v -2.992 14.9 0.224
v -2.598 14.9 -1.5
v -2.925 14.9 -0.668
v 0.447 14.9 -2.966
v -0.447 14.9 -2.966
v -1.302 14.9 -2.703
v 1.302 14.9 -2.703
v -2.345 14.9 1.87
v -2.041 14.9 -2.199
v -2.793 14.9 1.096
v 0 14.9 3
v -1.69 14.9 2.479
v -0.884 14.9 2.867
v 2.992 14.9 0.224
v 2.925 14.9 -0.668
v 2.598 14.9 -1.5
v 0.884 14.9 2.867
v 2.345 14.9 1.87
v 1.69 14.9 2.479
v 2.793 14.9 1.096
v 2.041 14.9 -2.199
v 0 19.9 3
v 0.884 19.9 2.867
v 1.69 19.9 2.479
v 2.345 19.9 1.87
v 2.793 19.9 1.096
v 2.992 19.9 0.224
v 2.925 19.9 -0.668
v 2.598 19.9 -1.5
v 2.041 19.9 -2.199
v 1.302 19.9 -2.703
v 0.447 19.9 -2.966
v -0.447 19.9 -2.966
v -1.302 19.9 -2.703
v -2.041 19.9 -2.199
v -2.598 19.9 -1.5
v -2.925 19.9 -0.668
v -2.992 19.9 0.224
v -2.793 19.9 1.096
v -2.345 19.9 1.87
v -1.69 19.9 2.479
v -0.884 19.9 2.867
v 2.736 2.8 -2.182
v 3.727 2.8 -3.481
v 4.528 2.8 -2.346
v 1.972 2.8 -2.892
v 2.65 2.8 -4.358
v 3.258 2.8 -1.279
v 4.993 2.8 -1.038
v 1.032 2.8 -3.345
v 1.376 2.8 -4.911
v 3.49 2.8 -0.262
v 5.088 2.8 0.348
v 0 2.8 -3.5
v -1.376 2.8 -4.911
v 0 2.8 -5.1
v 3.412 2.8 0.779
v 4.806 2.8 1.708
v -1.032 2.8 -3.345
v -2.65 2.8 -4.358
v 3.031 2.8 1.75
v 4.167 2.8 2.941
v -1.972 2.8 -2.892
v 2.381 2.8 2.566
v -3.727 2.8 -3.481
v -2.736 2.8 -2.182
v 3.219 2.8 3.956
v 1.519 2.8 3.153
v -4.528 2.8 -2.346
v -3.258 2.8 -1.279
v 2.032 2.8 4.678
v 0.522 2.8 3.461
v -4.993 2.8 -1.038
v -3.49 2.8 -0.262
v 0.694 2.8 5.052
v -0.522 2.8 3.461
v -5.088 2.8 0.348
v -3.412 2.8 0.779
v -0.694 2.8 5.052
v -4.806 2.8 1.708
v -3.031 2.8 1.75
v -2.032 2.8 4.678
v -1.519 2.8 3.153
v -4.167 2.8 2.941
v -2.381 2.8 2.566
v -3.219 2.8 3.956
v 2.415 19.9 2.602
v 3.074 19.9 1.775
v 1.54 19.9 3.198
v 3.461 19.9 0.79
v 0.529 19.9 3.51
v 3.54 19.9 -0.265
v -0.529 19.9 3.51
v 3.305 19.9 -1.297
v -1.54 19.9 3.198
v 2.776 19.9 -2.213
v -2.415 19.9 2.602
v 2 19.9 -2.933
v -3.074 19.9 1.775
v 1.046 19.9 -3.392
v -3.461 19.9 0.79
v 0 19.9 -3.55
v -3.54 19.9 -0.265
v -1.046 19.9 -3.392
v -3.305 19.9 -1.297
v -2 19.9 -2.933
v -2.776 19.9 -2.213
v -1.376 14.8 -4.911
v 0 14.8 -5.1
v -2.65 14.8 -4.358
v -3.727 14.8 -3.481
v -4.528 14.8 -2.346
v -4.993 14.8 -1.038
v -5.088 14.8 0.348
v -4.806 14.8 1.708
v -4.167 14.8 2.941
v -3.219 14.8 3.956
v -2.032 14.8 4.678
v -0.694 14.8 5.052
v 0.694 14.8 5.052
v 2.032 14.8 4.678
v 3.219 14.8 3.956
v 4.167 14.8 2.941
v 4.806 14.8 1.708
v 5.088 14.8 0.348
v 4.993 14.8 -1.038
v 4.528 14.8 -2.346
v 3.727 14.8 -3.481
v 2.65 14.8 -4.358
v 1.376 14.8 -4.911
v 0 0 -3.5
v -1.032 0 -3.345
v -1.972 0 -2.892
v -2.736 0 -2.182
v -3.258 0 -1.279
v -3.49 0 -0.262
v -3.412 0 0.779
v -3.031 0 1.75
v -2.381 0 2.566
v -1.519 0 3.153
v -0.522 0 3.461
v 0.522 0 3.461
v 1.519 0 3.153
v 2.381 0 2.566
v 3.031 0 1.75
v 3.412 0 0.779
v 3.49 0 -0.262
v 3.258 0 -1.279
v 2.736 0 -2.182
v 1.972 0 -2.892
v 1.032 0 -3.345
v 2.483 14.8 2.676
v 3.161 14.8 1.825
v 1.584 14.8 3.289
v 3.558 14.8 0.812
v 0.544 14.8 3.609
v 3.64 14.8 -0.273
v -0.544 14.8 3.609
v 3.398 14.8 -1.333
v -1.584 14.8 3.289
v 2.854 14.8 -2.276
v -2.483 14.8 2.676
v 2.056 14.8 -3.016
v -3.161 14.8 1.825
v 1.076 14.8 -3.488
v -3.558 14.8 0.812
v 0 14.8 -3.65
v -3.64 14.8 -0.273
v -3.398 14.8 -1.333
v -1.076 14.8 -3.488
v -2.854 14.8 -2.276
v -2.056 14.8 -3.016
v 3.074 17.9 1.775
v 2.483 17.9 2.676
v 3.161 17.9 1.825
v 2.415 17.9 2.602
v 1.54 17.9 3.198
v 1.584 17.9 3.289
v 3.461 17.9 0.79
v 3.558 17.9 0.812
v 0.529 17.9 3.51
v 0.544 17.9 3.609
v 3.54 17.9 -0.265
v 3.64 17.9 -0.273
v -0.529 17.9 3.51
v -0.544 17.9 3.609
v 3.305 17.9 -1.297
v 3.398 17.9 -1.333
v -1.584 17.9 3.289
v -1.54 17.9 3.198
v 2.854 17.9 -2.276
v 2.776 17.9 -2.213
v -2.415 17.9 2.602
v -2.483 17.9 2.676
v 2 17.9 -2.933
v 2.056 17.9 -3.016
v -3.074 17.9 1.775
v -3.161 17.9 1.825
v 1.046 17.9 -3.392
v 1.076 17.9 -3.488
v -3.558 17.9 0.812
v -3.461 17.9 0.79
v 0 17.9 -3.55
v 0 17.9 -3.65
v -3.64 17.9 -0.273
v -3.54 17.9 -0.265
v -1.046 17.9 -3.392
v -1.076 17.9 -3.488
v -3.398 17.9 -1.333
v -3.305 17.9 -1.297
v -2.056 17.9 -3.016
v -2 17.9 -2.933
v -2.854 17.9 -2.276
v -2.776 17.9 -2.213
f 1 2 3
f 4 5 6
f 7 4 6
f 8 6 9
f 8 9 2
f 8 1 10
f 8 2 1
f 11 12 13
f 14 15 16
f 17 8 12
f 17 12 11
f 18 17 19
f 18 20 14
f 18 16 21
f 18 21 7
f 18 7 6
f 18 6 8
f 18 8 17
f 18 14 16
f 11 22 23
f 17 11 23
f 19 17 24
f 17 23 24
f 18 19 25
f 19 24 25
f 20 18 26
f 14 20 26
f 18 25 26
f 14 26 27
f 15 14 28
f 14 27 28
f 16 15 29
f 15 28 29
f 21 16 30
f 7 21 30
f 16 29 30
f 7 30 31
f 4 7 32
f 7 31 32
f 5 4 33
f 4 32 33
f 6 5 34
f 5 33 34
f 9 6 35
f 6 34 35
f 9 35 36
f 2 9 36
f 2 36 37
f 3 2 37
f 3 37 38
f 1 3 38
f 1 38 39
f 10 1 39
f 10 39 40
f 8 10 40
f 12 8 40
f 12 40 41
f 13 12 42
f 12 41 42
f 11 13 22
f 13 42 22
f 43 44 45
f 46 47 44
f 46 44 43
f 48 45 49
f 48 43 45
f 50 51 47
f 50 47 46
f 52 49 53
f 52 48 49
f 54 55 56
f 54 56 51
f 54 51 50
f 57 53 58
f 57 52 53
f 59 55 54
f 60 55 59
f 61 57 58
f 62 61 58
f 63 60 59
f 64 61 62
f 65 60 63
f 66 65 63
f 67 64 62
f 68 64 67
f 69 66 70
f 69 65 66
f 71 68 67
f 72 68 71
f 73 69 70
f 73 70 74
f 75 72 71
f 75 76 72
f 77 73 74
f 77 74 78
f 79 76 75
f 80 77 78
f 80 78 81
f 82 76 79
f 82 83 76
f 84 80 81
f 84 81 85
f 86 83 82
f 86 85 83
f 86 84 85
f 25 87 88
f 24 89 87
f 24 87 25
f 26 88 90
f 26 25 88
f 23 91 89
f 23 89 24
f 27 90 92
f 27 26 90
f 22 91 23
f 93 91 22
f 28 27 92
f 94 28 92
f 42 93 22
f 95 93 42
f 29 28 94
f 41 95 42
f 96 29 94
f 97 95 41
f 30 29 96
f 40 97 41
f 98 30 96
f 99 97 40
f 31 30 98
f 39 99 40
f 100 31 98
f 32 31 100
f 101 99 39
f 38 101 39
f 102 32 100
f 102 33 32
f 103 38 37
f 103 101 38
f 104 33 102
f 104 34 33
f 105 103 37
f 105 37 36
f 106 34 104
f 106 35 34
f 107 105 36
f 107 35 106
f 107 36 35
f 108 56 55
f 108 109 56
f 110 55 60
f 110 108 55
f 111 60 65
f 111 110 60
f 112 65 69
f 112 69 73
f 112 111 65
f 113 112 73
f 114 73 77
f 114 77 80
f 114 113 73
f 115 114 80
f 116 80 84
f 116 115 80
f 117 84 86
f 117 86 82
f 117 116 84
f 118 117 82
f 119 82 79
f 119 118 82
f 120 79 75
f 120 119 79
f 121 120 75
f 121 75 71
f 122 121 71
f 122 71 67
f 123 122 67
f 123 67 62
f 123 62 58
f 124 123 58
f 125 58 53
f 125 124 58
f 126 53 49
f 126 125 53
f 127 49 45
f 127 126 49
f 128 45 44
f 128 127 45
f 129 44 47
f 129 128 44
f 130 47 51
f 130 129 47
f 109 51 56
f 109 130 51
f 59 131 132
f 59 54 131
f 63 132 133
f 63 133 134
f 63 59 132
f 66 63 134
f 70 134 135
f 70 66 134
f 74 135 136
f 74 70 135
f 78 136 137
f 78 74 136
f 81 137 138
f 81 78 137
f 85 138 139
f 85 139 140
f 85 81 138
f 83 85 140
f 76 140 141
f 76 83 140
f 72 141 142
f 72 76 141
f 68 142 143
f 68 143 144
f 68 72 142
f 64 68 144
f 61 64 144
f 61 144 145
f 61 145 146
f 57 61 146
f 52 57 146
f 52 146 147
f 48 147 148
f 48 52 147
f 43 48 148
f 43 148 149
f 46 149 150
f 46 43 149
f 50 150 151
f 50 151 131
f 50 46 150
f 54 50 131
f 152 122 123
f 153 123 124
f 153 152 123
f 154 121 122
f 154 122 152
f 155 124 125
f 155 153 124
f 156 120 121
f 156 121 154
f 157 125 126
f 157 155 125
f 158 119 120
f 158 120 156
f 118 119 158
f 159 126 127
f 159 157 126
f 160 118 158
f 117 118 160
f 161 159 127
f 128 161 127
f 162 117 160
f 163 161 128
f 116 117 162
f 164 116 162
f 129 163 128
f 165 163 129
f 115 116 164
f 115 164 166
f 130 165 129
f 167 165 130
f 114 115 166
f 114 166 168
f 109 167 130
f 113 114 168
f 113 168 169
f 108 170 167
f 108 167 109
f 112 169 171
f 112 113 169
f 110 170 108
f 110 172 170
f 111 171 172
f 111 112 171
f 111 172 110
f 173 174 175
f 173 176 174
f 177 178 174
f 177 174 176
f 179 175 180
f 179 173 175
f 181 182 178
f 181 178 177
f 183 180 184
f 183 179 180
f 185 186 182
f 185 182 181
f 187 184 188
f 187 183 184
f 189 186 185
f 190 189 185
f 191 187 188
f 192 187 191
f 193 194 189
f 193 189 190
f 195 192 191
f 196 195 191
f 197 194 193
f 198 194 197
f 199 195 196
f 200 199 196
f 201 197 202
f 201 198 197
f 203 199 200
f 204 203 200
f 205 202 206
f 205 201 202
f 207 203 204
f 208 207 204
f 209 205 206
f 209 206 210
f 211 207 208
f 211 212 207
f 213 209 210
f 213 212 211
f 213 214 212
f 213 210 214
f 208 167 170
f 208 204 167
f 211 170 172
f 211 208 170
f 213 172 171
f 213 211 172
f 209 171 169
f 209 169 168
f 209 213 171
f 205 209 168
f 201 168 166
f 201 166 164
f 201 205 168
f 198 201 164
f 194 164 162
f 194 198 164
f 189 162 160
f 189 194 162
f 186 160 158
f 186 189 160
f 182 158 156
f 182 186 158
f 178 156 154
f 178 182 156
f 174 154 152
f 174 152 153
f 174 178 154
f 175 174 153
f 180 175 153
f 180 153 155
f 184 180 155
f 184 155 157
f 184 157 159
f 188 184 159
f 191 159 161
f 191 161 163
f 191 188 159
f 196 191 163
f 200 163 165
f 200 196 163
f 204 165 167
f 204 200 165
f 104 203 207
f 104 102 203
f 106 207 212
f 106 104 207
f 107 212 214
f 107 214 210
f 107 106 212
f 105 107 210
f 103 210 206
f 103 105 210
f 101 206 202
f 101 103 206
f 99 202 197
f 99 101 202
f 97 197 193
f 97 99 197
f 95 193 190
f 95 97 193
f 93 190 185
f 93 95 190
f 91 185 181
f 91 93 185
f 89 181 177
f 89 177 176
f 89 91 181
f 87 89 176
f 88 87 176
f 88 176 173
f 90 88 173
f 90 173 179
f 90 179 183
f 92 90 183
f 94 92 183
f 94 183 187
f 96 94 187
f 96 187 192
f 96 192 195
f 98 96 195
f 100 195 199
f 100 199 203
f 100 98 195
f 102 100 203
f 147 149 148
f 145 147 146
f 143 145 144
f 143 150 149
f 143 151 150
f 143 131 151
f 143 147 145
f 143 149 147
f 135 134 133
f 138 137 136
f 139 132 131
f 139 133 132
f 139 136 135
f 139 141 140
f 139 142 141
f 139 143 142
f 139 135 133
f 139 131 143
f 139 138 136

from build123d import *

# Parameters (mm, degrees)
SKETCH3_R          = 3
CUT_EXTRUDE1_DEPTH = 5


with BuildPart() as part:
    # Sketch1 → Revolve1 (revolve)
    with BuildSketch(Plane.XY, mode=Mode.PRIVATE) as revolve1_sk:
        Polygon((0, 0), (3.5, 0), (3.5, 2.8), (5.1, 2.8), (5.1, 14.8), (3.65, 14.8), (3.65, 17.9), (3.55, 17.9), (3.55, 19.9), (0, 19.9), align=None)
    revolve(revolve1_sk.sketch.rotate(Axis((0, 0, 0), (0, 1, 0)), 90), axis=Axis((0, 0, 0), (0, 1, 0)))

    # Sketch3 → Cut-Extrude1 (cut)
    with BuildSketch(Plane(origin=(0, 19.9, 0), x_dir=(1, 0, 0), z_dir=(0, 1, 0))):
        with Locations(Location((0, 0, 0), (0, 0, 270))):
            Circle(SKETCH3_R)
    extrude(amount=-CUT_EXTRUDE1_DEPTH, mode=Mode.SUBTRACT)


solid = part.part
